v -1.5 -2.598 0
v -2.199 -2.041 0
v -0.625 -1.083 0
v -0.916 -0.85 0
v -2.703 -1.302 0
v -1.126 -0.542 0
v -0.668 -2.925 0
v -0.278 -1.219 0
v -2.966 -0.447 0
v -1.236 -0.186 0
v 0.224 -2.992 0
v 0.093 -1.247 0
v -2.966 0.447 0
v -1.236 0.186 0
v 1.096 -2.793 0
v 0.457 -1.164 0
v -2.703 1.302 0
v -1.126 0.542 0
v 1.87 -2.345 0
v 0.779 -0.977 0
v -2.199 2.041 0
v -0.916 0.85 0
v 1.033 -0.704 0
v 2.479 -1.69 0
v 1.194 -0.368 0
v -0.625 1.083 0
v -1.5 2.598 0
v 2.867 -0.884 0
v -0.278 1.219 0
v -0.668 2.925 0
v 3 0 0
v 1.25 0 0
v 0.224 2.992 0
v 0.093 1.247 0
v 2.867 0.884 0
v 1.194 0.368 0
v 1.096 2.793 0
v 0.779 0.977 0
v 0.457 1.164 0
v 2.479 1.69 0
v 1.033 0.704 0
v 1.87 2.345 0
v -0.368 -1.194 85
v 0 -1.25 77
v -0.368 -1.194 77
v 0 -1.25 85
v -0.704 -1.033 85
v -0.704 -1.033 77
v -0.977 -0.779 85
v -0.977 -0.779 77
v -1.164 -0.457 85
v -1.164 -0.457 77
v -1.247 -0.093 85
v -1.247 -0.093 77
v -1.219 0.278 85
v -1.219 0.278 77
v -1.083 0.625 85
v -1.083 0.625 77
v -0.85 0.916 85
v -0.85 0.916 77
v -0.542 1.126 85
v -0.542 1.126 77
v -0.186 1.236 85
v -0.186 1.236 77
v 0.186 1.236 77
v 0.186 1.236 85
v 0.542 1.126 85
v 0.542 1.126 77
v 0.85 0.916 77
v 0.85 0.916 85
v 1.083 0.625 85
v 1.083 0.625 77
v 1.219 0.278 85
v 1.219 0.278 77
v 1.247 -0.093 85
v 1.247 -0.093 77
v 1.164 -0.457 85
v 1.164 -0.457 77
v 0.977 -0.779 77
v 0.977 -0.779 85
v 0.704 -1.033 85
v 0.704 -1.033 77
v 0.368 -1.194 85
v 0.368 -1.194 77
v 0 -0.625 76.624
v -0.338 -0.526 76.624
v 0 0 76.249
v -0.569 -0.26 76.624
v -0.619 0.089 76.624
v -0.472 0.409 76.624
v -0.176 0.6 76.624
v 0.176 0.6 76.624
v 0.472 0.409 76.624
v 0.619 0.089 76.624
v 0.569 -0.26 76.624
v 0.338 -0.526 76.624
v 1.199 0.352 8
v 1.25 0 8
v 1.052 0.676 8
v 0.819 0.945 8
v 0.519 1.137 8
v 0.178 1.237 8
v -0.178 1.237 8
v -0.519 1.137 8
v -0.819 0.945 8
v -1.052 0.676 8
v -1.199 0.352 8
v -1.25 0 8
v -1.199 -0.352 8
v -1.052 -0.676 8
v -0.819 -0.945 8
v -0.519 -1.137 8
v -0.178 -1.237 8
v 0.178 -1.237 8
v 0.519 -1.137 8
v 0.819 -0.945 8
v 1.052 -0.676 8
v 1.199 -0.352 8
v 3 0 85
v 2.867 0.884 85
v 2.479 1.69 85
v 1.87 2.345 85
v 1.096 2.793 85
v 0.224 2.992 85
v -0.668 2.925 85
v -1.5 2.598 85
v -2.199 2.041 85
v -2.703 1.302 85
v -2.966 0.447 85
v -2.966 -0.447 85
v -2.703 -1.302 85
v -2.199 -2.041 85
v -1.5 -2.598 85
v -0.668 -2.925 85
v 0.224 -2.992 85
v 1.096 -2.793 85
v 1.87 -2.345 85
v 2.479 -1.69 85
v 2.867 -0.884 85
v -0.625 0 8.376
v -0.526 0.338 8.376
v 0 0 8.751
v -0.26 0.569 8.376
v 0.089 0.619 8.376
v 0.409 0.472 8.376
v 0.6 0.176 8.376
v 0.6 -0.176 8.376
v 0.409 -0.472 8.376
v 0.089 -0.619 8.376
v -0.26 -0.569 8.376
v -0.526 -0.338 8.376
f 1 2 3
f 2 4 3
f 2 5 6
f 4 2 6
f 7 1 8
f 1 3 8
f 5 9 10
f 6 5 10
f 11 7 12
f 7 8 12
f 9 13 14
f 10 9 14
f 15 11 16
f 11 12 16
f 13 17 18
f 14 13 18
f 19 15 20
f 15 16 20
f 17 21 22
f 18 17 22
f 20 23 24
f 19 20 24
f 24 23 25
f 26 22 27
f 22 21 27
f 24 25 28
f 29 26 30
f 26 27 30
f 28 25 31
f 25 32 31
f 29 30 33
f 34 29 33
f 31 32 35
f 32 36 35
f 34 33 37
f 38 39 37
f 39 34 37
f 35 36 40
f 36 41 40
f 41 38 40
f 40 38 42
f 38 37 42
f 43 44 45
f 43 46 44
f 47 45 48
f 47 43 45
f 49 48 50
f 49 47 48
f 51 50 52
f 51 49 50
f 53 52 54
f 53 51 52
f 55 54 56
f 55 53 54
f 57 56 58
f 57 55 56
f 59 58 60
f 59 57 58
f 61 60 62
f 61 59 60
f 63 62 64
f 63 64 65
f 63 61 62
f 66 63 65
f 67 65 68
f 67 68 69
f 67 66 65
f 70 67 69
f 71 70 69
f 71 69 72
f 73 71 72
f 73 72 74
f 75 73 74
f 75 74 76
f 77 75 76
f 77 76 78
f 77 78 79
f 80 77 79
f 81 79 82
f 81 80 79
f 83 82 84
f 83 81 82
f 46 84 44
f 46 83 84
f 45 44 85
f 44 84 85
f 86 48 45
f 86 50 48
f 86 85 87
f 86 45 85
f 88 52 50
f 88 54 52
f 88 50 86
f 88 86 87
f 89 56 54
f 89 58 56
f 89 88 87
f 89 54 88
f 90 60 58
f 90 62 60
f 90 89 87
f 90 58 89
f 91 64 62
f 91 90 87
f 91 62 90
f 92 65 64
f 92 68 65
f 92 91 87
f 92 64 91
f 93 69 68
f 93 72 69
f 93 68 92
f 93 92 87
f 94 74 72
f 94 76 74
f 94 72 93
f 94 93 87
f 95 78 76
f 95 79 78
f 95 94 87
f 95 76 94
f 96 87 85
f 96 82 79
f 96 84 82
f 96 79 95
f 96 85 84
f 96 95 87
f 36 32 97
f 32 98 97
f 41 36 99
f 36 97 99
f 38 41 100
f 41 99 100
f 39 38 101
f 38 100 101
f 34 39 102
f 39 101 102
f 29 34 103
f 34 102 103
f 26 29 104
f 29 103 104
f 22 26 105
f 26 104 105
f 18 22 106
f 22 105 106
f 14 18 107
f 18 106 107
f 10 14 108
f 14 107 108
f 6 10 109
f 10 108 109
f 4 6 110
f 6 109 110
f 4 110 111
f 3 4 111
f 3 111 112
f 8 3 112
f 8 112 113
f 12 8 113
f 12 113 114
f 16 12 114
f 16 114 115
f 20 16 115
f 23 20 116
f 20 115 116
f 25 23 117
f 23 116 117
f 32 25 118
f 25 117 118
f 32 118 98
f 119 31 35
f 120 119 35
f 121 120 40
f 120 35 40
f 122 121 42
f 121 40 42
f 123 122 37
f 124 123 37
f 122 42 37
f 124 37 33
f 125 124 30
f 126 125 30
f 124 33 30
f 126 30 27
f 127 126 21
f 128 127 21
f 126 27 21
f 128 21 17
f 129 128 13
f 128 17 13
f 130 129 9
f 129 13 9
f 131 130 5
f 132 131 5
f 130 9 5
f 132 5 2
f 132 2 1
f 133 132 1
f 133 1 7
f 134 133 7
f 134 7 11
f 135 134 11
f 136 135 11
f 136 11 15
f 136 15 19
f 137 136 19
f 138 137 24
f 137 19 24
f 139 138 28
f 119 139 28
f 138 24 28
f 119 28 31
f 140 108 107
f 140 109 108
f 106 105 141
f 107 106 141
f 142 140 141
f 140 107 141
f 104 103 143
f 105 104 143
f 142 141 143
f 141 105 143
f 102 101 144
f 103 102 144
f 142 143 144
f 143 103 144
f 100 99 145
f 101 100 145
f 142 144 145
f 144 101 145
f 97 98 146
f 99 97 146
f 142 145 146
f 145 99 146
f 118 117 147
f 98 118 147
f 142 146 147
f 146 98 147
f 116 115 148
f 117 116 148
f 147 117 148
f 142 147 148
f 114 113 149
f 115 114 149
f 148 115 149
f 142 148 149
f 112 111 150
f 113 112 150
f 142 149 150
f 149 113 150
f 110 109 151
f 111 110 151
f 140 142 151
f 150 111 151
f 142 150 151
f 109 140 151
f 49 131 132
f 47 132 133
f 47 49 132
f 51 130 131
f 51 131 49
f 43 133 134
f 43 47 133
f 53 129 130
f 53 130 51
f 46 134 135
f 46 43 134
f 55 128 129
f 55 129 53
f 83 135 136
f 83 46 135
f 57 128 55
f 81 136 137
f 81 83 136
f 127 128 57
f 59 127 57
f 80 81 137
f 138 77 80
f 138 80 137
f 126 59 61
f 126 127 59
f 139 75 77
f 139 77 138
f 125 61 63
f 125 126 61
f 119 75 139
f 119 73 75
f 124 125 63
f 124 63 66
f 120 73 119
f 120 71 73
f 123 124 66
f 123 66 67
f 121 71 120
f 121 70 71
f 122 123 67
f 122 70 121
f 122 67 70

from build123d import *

# Parameters (mm, degrees)
ESBO_O1_R                                   = 3
RESSALTO_EXTRUS_O1_DEPTH                    = 85
BROCA_DE_ROSQUEAR_PARA_TARRAXA_DE_M32_D     = 2.5
BROCA_DE_ROSQUEAR_PARA_TARRAXA_DE_M32_DEPTH = 8
BROCA_DE_ROSQUEAR_PARA_TARRAXA_DE_M32_TIP   = 0.751075774


with BuildPart() as part:
    # Esboço1 → Ressalto-extrusão1 (new body)
    with BuildSketch(Plane.XY):
        Circle(ESBO_O1_R)
    extrude(amount=RESSALTO_EXTRUS_O1_DEPTH)

    # Esboço2 → Broca de rosquear para tarraxa de M31 (revolve, cut)
    with BuildSketch(Plane(origin=(0, 0, 85), x_dir=(0, -1, 0), z_dir=(1, 0, 0))):
        Polygon((0, 0), (0, 8.751075774), (1.25, 8), (1.25, 0), align=None)
    revolve(axis=Axis((0, 0, 91.35), (0, 0, -1)), mode=Mode.SUBTRACT)

    # Broca de rosquear para tarraxa de M32
    with Locations(Plane(origin=(0, 0, 0), x_dir=(-1, 0, 0), z_dir=(0, 0, -1))):
        with Locations((0, 0)):
            Hole(BROCA_DE_ROSQUEAR_PARA_TARRAXA_DE_M32_D / 2, depth=BROCA_DE_ROSQUEAR_PARA_TARRAXA_DE_M32_DEPTH)
            with Locations((0, 0, -(BROCA_DE_ROSQUEAR_PARA_TARRAXA_DE_M32_DEPTH + BROCA_DE_ROSQUEAR_PARA_TARRAXA_DE_M32_TIP / 2))):  # 118° drill point
                Cone(0, BROCA_DE_ROSQUEAR_PARA_TARRAXA_DE_M32_D / 2, BROCA_DE_ROSQUEAR_PARA_TARRAXA_DE_M32_TIP, mode=Mode.SUBTRACT)


solid = part.part
